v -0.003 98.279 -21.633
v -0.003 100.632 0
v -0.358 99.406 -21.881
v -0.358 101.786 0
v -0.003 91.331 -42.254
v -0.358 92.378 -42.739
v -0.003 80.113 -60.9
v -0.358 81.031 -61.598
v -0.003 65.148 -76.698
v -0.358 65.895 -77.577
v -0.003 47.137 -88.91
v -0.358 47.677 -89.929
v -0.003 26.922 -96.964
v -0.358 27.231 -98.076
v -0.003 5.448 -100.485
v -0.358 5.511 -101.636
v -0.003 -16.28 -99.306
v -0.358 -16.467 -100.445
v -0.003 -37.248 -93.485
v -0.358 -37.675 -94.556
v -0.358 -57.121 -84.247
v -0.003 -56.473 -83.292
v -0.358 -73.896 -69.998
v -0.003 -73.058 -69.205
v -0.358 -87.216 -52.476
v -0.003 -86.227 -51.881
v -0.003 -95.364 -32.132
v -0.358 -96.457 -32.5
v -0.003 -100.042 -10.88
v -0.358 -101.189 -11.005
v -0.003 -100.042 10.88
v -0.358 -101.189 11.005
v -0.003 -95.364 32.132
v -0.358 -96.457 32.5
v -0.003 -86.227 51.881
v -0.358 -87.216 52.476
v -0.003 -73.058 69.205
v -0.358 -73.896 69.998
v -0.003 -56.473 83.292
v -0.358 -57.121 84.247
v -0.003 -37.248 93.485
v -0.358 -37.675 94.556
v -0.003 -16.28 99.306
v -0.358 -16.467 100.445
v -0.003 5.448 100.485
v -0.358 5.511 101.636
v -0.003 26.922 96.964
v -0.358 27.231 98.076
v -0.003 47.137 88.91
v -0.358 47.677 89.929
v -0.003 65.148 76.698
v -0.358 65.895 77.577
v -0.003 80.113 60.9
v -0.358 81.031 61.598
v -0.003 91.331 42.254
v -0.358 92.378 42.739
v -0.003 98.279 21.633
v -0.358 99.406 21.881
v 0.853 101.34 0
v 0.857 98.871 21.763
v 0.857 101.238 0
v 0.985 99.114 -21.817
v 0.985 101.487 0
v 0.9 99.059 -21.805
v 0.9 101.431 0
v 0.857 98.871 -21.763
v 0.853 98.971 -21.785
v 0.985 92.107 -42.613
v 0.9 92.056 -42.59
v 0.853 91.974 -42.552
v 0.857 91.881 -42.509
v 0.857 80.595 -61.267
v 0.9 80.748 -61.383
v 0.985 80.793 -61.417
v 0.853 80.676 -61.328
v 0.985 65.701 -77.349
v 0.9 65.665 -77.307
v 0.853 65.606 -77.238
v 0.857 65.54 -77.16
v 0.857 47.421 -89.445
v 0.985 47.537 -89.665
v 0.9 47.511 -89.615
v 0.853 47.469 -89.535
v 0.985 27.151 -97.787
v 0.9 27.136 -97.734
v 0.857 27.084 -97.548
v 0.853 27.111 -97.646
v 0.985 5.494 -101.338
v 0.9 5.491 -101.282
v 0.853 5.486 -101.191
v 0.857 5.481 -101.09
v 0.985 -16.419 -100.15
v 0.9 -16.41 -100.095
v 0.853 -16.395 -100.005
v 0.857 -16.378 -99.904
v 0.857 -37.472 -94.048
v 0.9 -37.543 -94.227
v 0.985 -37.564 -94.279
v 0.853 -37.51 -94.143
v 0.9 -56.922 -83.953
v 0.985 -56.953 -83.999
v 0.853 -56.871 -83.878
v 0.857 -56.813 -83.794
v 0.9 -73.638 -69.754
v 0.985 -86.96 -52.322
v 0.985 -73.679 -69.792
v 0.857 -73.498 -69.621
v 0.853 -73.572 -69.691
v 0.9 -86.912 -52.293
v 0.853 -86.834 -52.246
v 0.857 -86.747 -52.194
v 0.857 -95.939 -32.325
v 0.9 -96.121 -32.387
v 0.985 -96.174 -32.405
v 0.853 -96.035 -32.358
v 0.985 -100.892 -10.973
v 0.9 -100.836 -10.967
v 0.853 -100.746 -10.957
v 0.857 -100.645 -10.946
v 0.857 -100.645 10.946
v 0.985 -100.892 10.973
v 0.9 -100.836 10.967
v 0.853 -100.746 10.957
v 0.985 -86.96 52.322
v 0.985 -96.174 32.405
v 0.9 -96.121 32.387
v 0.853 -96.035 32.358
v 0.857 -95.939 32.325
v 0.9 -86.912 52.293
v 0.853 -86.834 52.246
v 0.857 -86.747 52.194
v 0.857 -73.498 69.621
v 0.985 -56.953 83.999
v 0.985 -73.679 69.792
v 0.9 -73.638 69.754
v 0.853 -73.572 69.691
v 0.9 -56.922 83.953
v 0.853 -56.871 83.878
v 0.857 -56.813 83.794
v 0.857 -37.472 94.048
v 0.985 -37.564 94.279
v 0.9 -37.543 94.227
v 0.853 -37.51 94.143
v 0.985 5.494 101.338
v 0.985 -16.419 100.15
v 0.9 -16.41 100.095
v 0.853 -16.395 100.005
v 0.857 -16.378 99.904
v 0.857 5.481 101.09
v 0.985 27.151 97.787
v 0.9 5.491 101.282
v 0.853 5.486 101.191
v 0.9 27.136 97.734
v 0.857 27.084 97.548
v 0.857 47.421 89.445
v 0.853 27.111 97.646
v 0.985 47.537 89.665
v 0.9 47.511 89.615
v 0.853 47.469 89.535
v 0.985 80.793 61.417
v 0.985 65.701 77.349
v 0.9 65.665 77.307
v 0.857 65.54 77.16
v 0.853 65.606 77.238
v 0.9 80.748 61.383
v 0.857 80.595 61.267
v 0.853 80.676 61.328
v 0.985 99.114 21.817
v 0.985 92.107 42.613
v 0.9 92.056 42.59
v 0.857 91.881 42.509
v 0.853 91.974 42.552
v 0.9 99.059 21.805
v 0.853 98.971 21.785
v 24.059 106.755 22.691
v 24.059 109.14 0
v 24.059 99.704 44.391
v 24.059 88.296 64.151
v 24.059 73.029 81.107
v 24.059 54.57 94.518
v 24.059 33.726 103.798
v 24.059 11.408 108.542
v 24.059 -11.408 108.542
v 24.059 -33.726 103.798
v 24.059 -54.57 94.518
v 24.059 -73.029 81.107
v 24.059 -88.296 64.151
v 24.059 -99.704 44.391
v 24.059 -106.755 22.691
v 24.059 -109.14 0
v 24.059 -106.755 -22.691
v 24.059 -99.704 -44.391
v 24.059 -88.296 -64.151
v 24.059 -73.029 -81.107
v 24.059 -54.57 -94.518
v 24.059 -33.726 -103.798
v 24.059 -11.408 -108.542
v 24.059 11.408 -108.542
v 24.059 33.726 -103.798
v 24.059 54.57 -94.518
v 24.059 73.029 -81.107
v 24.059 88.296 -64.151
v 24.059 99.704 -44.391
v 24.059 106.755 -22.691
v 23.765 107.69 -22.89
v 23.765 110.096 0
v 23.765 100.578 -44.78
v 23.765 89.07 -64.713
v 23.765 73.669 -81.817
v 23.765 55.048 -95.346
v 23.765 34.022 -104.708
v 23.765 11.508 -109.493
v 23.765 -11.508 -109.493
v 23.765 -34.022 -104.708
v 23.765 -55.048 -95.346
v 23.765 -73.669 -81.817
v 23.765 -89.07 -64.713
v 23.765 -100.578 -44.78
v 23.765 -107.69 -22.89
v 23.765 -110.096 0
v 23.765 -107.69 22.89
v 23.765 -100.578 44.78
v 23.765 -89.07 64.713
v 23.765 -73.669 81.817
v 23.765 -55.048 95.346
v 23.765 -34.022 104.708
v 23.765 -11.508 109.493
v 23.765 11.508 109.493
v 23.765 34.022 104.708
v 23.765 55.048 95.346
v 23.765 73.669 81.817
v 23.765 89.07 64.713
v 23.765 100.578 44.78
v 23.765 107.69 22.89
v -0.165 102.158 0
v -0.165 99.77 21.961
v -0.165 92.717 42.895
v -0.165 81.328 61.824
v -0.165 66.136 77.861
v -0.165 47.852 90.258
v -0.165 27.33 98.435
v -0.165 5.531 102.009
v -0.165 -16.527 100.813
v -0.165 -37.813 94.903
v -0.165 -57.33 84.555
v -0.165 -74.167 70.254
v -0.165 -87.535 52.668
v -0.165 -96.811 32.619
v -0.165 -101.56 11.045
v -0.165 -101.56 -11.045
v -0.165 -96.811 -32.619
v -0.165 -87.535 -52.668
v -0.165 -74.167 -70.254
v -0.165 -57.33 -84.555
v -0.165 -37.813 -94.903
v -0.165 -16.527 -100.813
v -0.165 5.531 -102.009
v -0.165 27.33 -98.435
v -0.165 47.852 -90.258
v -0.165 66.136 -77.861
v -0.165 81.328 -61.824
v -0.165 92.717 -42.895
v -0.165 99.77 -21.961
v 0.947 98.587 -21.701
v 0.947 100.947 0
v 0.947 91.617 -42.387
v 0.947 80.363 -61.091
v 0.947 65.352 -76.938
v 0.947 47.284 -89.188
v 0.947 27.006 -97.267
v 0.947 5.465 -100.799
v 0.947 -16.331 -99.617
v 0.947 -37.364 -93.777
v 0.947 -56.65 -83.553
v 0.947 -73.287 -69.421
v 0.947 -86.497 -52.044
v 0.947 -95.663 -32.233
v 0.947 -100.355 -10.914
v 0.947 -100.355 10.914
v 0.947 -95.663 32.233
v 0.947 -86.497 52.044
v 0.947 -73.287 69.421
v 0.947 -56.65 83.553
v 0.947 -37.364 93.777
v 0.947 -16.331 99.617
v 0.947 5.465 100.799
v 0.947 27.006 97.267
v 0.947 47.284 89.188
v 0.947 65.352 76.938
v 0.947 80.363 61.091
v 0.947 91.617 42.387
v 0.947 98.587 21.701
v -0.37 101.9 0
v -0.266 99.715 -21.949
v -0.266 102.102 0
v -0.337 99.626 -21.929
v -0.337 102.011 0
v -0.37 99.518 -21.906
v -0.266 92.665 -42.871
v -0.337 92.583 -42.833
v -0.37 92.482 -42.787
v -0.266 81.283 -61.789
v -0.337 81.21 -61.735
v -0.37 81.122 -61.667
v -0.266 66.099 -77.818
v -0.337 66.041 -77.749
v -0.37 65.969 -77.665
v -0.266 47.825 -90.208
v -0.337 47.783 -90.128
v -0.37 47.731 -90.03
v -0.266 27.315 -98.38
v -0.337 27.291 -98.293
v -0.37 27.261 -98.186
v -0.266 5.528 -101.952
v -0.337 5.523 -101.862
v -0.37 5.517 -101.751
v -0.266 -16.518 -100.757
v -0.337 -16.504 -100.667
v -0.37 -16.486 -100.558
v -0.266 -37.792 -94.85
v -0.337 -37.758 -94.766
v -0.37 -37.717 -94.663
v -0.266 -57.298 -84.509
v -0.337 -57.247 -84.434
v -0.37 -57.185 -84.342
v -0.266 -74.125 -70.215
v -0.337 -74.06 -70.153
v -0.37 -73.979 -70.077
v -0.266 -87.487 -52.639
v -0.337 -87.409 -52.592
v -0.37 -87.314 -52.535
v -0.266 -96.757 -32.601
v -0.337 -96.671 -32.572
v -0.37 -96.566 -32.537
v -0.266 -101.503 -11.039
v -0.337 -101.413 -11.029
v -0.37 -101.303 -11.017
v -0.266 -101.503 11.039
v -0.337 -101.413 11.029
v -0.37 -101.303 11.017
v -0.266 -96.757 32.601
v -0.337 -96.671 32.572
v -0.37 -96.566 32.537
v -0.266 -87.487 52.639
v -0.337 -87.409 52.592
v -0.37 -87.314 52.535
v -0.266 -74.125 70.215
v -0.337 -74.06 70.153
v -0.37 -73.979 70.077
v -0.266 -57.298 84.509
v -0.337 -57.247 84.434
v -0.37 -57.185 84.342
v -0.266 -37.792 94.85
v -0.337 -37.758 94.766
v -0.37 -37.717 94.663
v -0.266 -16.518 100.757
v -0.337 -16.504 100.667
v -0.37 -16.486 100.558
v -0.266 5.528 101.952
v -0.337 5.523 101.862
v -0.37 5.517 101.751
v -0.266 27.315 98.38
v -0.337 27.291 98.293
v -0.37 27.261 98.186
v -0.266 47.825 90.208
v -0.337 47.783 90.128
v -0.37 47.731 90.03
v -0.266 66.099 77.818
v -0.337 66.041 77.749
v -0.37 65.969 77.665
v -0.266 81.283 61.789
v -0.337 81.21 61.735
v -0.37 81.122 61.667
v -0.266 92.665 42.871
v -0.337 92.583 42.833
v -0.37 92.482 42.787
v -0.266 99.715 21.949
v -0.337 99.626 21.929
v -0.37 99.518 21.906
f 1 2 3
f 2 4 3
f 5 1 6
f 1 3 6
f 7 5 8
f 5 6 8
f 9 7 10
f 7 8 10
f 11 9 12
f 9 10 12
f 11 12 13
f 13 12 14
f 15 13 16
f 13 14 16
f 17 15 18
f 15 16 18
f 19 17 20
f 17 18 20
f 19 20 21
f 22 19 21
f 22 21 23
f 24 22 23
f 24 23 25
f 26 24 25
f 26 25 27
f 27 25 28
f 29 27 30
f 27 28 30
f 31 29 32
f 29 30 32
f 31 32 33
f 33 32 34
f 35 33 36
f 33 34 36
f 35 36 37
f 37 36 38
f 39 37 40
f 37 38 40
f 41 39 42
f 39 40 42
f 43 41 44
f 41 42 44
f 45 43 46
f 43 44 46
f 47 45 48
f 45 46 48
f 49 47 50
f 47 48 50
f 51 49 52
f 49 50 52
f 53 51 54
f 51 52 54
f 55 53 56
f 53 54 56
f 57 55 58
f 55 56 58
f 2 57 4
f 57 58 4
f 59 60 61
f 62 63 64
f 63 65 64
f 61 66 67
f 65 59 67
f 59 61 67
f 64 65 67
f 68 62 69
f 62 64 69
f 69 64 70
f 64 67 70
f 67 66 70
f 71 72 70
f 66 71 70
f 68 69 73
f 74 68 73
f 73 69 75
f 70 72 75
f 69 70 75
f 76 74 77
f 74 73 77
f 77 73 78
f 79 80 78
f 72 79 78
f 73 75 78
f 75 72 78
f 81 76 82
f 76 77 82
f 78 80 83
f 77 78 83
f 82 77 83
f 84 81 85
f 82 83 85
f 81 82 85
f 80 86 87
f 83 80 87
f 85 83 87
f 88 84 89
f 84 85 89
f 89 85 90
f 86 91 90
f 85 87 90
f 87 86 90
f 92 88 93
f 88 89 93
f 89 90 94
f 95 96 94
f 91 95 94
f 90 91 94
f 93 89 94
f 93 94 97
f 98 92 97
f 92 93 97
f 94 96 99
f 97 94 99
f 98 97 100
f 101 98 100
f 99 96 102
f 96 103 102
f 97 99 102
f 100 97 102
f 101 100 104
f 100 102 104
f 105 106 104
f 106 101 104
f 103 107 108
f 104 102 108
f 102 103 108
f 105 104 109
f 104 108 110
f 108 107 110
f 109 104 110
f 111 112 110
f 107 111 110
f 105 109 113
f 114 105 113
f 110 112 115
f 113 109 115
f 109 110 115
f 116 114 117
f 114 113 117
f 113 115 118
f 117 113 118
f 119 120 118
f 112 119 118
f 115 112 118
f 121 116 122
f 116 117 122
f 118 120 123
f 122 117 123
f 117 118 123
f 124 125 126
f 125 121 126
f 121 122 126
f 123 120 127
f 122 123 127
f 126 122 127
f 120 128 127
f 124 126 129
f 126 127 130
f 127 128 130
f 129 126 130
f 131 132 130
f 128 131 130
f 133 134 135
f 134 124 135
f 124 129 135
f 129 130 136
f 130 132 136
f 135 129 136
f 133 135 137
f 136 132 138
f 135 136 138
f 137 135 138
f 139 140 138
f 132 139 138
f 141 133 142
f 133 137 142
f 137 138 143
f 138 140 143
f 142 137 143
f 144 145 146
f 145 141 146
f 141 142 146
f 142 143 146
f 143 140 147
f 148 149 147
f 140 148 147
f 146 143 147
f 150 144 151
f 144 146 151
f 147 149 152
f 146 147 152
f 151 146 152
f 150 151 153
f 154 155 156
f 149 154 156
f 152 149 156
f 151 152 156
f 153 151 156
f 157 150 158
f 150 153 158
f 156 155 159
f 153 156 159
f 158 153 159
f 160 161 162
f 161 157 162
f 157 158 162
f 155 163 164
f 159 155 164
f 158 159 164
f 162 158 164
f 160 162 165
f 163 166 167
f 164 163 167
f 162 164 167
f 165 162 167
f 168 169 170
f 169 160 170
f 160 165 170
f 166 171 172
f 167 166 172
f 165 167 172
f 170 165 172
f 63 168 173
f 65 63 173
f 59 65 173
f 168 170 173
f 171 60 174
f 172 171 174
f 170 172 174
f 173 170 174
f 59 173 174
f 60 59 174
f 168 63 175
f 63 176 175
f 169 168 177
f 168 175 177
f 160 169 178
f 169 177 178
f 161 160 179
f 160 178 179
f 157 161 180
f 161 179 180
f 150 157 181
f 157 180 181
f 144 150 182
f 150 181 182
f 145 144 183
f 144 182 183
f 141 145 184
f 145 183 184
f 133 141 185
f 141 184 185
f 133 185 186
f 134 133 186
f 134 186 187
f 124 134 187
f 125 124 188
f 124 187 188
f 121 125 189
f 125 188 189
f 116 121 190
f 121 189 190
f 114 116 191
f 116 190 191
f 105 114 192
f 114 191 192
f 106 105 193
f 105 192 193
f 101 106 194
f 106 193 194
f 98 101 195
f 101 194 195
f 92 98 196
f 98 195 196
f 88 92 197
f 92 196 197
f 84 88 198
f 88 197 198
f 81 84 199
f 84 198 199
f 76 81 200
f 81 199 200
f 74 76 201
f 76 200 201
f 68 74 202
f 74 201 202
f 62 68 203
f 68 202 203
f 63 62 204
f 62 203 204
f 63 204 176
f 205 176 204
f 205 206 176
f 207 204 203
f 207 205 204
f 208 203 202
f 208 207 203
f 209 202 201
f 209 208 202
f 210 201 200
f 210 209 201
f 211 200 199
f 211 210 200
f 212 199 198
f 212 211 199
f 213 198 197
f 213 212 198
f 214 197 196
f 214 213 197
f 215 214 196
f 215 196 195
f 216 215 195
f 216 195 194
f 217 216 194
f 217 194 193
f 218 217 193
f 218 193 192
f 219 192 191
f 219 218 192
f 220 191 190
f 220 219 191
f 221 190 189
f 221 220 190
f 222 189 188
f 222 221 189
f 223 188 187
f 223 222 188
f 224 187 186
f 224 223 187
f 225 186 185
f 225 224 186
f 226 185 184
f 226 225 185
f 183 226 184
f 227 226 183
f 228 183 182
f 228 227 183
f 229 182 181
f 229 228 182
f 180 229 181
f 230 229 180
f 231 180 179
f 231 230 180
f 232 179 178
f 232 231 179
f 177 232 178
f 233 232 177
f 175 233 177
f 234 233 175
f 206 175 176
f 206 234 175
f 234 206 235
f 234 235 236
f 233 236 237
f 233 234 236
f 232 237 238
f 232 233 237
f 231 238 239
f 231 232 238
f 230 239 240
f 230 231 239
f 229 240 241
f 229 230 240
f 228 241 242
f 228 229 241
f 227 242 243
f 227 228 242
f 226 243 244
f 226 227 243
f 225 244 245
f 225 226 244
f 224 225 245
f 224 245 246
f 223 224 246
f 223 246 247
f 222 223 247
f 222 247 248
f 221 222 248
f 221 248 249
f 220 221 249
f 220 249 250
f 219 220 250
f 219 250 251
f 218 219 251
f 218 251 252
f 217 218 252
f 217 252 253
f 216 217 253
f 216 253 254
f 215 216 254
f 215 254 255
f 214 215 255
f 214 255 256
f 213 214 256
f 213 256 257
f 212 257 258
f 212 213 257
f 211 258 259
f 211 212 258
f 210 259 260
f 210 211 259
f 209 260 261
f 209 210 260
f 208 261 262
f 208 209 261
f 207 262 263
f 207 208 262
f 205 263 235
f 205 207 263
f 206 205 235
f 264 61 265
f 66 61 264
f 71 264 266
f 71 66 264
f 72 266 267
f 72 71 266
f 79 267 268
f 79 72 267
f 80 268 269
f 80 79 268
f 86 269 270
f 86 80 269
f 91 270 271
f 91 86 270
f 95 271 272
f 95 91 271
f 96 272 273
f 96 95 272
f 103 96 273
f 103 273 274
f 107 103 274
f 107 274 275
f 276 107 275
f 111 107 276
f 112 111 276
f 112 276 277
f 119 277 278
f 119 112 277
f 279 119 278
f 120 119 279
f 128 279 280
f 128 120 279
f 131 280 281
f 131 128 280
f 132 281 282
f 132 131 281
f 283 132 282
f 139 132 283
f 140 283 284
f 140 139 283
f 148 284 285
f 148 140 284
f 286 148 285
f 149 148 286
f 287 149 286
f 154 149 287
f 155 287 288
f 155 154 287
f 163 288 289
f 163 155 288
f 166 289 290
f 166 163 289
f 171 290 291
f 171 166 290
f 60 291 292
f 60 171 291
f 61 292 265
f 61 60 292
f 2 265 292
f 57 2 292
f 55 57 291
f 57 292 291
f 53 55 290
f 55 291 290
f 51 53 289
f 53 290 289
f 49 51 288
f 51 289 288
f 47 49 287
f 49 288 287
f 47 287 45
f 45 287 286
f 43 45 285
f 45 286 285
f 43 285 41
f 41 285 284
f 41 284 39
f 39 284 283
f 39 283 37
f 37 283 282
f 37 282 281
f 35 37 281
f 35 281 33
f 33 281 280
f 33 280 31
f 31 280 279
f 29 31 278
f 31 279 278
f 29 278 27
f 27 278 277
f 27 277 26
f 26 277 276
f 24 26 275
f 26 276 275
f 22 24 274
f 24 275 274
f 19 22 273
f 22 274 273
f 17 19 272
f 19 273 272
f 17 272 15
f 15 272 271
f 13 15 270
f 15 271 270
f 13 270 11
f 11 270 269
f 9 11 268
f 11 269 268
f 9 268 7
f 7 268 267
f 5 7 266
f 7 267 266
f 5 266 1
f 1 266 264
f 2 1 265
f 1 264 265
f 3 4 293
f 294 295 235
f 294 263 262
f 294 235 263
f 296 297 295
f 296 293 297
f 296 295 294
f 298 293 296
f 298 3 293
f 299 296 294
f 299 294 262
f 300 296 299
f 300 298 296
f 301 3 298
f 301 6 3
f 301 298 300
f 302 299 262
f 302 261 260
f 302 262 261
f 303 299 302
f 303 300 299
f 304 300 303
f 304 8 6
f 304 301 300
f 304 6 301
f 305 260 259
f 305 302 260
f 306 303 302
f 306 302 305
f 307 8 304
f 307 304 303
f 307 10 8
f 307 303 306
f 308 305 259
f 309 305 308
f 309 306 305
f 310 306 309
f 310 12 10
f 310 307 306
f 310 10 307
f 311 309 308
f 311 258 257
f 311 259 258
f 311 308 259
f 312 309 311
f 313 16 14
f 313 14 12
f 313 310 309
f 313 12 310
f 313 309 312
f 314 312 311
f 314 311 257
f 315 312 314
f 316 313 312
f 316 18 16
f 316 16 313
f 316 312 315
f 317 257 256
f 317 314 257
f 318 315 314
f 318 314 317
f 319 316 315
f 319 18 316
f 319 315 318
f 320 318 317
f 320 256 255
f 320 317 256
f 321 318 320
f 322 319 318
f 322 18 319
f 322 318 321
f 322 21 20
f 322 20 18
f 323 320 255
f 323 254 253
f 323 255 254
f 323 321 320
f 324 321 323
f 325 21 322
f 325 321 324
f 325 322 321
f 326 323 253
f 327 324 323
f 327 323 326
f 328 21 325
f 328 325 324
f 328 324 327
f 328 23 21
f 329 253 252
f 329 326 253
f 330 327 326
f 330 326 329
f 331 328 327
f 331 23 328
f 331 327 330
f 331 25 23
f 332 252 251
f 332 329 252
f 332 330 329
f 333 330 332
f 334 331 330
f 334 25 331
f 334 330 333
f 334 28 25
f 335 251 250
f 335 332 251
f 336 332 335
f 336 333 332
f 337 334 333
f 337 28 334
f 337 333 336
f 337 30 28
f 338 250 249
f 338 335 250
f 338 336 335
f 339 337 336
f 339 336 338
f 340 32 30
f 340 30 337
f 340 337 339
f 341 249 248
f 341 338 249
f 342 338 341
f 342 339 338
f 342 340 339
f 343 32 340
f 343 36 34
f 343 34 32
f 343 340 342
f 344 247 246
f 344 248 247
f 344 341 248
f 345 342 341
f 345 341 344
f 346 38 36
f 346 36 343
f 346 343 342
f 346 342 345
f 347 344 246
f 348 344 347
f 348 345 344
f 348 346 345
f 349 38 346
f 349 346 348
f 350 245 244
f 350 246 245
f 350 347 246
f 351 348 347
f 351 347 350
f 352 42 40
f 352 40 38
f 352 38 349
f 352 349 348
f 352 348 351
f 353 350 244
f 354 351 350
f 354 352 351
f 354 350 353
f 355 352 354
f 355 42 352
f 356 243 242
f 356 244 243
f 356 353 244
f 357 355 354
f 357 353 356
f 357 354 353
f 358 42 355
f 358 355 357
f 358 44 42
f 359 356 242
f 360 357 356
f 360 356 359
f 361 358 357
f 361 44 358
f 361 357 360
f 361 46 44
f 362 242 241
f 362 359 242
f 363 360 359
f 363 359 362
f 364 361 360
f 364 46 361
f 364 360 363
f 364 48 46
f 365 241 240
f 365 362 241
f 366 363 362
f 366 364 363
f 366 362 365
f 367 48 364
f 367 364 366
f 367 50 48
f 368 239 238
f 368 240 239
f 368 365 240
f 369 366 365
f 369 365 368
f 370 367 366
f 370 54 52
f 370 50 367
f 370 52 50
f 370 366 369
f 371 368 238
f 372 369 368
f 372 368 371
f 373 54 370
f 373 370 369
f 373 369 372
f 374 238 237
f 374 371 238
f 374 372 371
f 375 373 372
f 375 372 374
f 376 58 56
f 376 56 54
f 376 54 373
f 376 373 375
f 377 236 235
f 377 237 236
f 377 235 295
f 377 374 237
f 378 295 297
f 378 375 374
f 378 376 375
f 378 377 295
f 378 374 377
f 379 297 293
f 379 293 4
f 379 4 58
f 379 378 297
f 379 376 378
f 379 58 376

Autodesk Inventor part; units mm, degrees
sketch "Sketch_1" plane through (0, 0, 0) normal (0, 0, 1) x (1, 0, 0)
  line L0 (50, 0) -> (-50, 0)
  arc A0 (-0.1653, 102.1585) -> (-0.3576, 101.7856) centre (-0.0709, 101.8738) ccw
  line L1 (-0.3576, 101.7856) -> (-0.0028, 100.6321)
  line L2 (-0.0028, 100.6321) -> (0.9466, 100.947)
  line L3 (0.9466, 100.947) -> (0.8571, 101.238)
  arc A1 (0.9853, 101.4866) -> (0.8571, 101.238) centre (1.0482, 101.2968) ccw
  line L4 (0.9853, 101.4866) -> (24.0593, 109.1399)
  line L5 (24.0593, 109.1399) -> (23.7652, 110.096)
  line L6 (23.7652, 110.096) -> (-0.1653, 102.1585)
revolve "Revolution1" add sketch "Sketch_1" angle 360 about axis through (50, 0, 0) along (1, 0, 0)
ref_plane "cage_XY" through (0, 0, 0) normal (0, 0, 1) x (1, 0, 0)
ref_plane "cage_YZ" through (0, 0, 0) normal (1, 0, 0) x (0, 1, 0)
ref_plane "cage_ZX" through (0, 0, 0) normal (0, 1, 0) x (0, 0, 1)
ref_plane "roller1_XY" through (0, 100.0165, 0) normal (1, 0, 0) x (0, 0, -1)
ref_plane "roller1_YZ" through (0, 100.0165, 0) normal (0, 0, -1) x (0, 1, 0)
ref_plane "roller1_ZX" through (0, 100.0165, 0) normal (0, 1, 0) x (1, 0, 0)
ref_plane "roller10_XY" through (0, 4.2448, 99.9264) normal (1, 0, 0) x (0, 0.9991, -0.0424)
ref_plane "roller10_YZ" through (0, 4.2448, 99.9264) normal (0, 0.9991, -0.0424) x (0, 0.0424, 0.9991)
ref_plane "roller10_ZX" through (0, 4.2448, 99.9264) normal (0, 0.0424, 0.9991) x (1, 0, 0)
ref_plane "roller11_XY" through (0, -12.7039, 99.2064) normal (1, 0, 0) x (0, 0.9919, 0.127)
ref_plane "roller11_YZ" through (0, -12.7039, 99.2064) normal (0, 0.9919, 0.127) x (0, -0.127, 0.9919)
ref_plane "roller11_ZX" through (0, -12.7039, 99.2064) normal (0, -0.127, 0.9919) x (1, 0, 0)
ref_plane "roller12_XY" through (0, -29.2871, 95.6325) normal (1, 0, 0) x (0, 0.9562, 0.2928)
ref_plane "roller12_YZ" through (0, -29.2871, 95.6325) normal (0, 0.9562, 0.2928) x (0, -0.2928, 0.9562)
ref_plane "roller12_ZX" through (0, -29.2871, 95.6325) normal (0, -0.2928, 0.9562) x (1, 0, 0)
ref_plane "roller13_XY" through (0, -45.0278, 89.3073) normal (1, 0, 0) x (0, 0.8929, 0.4502)
ref_plane "roller13_YZ" through (0, -45.0278, 89.3073) normal (0, 0.8929, 0.4502) x (0, -0.4502, 0.8929)
ref_plane "roller13_ZX" through (0, -45.0278, 89.3073) normal (0, -0.4502, 0.8929) x (1, 0, 0)
ref_plane "roller14_XY" through (0, -59.4731, 80.413) normal (1, 0, 0) x (0, 0.804, 0.5946)
ref_plane "roller14_YZ" through (0, -59.4731, 80.413) normal (0, 0.804, 0.5946) x (0, -0.5946, 0.804)
ref_plane "roller14_ZX" through (0, -59.4731, 80.413) normal (0, -0.5946, 0.804) x (1, 0, 0)
ref_plane "roller15_XY" through (0, -72.2075, 69.2053) normal (1, 0, 0) x (0, 0.6919, 0.722)
ref_plane "roller15_YZ" through (0, -72.2075, 69.2053) normal (0, 0.6919, 0.722) x (0, -0.722, 0.6919)
ref_plane "roller15_ZX" through (0, -72.2075, 69.2053) normal (0, -0.722, 0.6919) x (1, 0, 0)
ref_plane "roller16_XY" through (0, -82.8646, 56.0067) normal (1, 0, 0) x (0, 0.56, 0.8285)
ref_plane "roller16_YZ" through (0, -82.8646, 56.0067) normal (0, 0.56, 0.8285) x (0, -0.8285, 0.56)
ref_plane "roller16_ZX" through (0, -82.8646, 56.0067) normal (0, -0.8285, 0.56) x (1, 0, 0)
ref_plane "roller17_XY" through (0, -91.1379, 41.1969) normal (1, 0, 0) x (0, 0.4119, 0.9112)
ref_plane "roller17_YZ" through (0, -91.1379, 41.1969) normal (0, 0.4119, 0.9112) x (0, -0.9112, 0.4119)
ref_plane "roller17_ZX" through (0, -91.1379, 41.1969) normal (0, -0.9112, 0.4119) x (1, 0, 0)
ref_plane "roller18_XY" through (0, -96.7893, 25.202) normal (1, 0, 0) x (0, 0.252, 0.9677)
ref_plane "roller18_YZ" through (0, -96.7893, 25.202) normal (0, 0.252, 0.9677) x (0, -0.9677, 0.252)
ref_plane "roller18_ZX" through (0, -96.7893, 25.202) normal (0, -0.9677, 0.252) x (1, 0, 0)
ref_plane "roller19_XY" through (0, -99.6562, 8.482) normal (1, 0, 0) x (0, 0.0848, 0.9964)
ref_plane "roller19_YZ" through (0, -99.6562, 8.482) normal (0, 0.0848, 0.9964) x (0, -0.9964, 0.0848)
ref_plane "roller19_ZX" through (0, -99.6562, 8.482) normal (0, -0.9964, 0.0848) x (1, 0, 0)
ref_plane "roller2_XY" through (0, 98.5779, 16.9029) normal (1, 0, 0) x (0, 0.169, -0.9856)
ref_plane "roller2_YZ" through (0, 98.5779, 16.9029) normal (0, 0.169, -0.9856) x (0, 0.9856, 0.169)
ref_plane "roller2_ZX" through (0, 98.5779, 16.9029) normal (0, 0.9856, 0.169) x (1, 0, 0)
ref_plane "roller20_XY" through (0, -99.6562, -8.482) normal (1, 0, 0) x (0, -0.0848, 0.9964)
ref_plane "roller20_YZ" through (0, -99.6562, -8.482) normal (0, -0.0848, 0.9964) x (0, -0.9964, -0.0848)
ref_plane "roller20_ZX" through (0, -99.6562, -8.482) normal (0, -0.9964, -0.0848) x (1, 0, 0)
ref_plane "roller21_XY" through (0, -96.7893, -25.202) normal (1, 0, 0) x (0, -0.252, 0.9677)
ref_plane "roller21_YZ" through (0, -96.7893, -25.202) normal (0, -0.252, 0.9677) x (0, -0.9677, -0.252)
ref_plane "roller21_ZX" through (0, -96.7893, -25.202) normal (0, -0.9677, -0.252) x (1, 0, 0)
ref_plane "roller22_XY" through (0, -91.1379, -41.1969) normal (1, 0, 0) x (0, -0.4119, 0.9112)
ref_plane "roller22_YZ" through (0, -91.1379, -41.1969) normal (0, -0.4119, 0.9112) x (0, -0.9112, -0.4119)
ref_plane "roller22_ZX" through (0, -91.1379, -41.1969) normal (0, -0.9112, -0.4119) x (1, 0, 0)
ref_plane "roller23_XY" through (0, -82.8646, -56.0067) normal (1, 0, 0) x (0, -0.56, 0.8285)
ref_plane "roller23_YZ" through (0, -82.8646, -56.0067) normal (0, -0.56, 0.8285) x (0, -0.8285, -0.56)
ref_plane "roller23_ZX" through (0, -82.8646, -56.0067) normal (0, -0.8285, -0.56) x (1, 0, 0)
ref_plane "roller24_XY" through (0, -72.2075, -69.2053) normal (1, 0, 0) x (0, -0.6919, 0.722)
ref_plane "roller24_YZ" through (0, -72.2075, -69.2053) normal (0, -0.6919, 0.722) x (0, -0.722, -0.6919)
ref_plane "roller24_ZX" through (0, -72.2075, -69.2053) normal (0, -0.722, -0.6919) x (1, 0, 0)
ref_plane "roller25_XY" through (0, -59.4731, -80.413) normal (1, 0, 0) x (0, -0.804, 0.5946)
ref_plane "roller25_YZ" through (0, -59.4731, -80.413) normal (0, -0.804, 0.5946) x (0, -0.5946, -0.804)
ref_plane "roller25_ZX" through (0, -59.4731, -80.413) normal (0, -0.5946, -0.804) x (1, 0, 0)
ref_plane "roller26_XY" through (0, -45.0278, -89.3073) normal (1, 0, 0) x (0, -0.8929, 0.4502)
ref_plane "roller26_YZ" through (0, -45.0278, -89.3073) normal (0, -0.8929, 0.4502) x (0, -0.4502, -0.8929)
ref_plane "roller26_ZX" through (0, -45.0278, -89.3073) normal (0, -0.4502, -0.8929) x (1, 0, 0)
ref_plane "roller27_XY" through (0, -29.2871, -95.6325) normal (1, 0, 0) x (0, -0.9562, 0.2928)
ref_plane "roller27_YZ" through (0, -29.2871, -95.6325) normal (0, -0.9562, 0.2928) x (0, -0.2928, -0.9562)
ref_plane "roller27_ZX" through (0, -29.2871, -95.6325) normal (0, -0.2928, -0.9562) x (1, 0, 0)
ref_plane "roller28_XY" through (0, -12.7039, -99.2064) normal (1, 0, 0) x (0, -0.9919, 0.127)
ref_plane "roller28_YZ" through (0, -12.7039, -99.2064) normal (0, -0.9919, 0.127) x (0, -0.127, -0.9919)
ref_plane "roller28_ZX" through (0, -12.7039, -99.2064) normal (0, -0.127, -0.9919) x (1, 0, 0)
ref_plane "roller29_XY" through (0, 4.2448, -99.9264) normal (1, 0, 0) x (0, -0.9991, -0.0424)
ref_plane "roller29_YZ" through (0, 4.2448, -99.9264) normal (0, -0.9991, -0.0424) x (0, 0.0424, -0.9991)
ref_plane "roller29_ZX" through (0, 4.2448, -99.9264) normal (0, 0.0424, -0.9991) x (1, 0, 0)
ref_plane "roller3_XY" through (0, 94.3033, 33.3195) normal (1, 0, 0) x (0, 0.3331, -0.9429)
ref_plane "roller3_YZ" through (0, 94.3033, 33.3195) normal (0, 0.3331, -0.9429) x (0, 0.9429, 0.3331)
ref_plane "roller3_ZX" through (0, 94.3033, 33.3195) normal (0, 0.9429, 0.3331) x (1, 0, 0)
ref_plane "roller30_XY" through (0, 21.0714, -97.7717) normal (1, 0, 0) x (0, -0.9776, -0.2107)
ref_plane "roller30_YZ" through (0, 21.0714, -97.7717) normal (0, -0.9776, -0.2107) x (0, 0.2107, -0.9776)
ref_plane "roller30_ZX" through (0, 21.0714, -97.7717) normal (0, 0.2107, -0.9776) x (1, 0, 0)
ref_plane "roller31_XY" through (0, 37.2918, -92.8042) normal (1, 0, 0) x (0, -0.9279, -0.3729)
ref_plane "roller31_YZ" through (0, 37.2918, -92.8042) normal (0, -0.9279, -0.3729) x (0, 0.3729, -0.9279)
ref_plane "roller31_ZX" through (0, 37.2918, -92.8042) normal (0, 0.3729, -0.9279) x (1, 0, 0)
ref_plane "roller32_XY" through (0, 52.4394, -85.167) normal (1, 0, 0) x (0, -0.8515, -0.5243)
ref_plane "roller32_YZ" through (0, 52.4394, -85.167) normal (0, -0.8515, -0.5243) x (0, 0.5243, -0.8515)
ref_plane "roller32_ZX" through (0, 52.4394, -85.167) normal (0, 0.5243, -0.8515) x (1, 0, 0)
ref_plane "roller33_XY" through (0, 66.0784, -75.0796) normal (1, 0, 0) x (0, -0.7507, -0.6607)
ref_plane "roller33_YZ" through (0, 66.0784, -75.0796) normal (0, -0.7507, -0.6607) x (0, 0.6607, -0.7507)
ref_plane "roller33_ZX" through (0, 66.0784, -75.0796) normal (0, 0.6607, -0.7507) x (1, 0, 0)
ref_plane "roller34_XY" through (0, 77.8164, -62.8324) normal (1, 0, 0) x (0, -0.6282, -0.778)
ref_plane "roller34_YZ" through (0, 77.8164, -62.8324) normal (0, -0.6282, -0.778) x (0, 0.778, -0.6282)
ref_plane "roller34_ZX" through (0, 77.8164, -62.8324) normal (0, 0.778, -0.6282) x (1, 0, 0)
ref_plane "roller35_XY" through (0, 87.3158, -48.7775) normal (1, 0, 0) x (0, -0.4877, -0.873)
ref_plane "roller35_YZ" through (0, 87.3158, -48.7775) normal (0, -0.4877, -0.873) x (0, 0.873, -0.4877)
ref_plane "roller35_ZX" through (0, 87.3158, -48.7775) normal (0, 0.873, -0.4877) x (1, 0, 0)
ref_plane "roller36_XY" through (0, 94.3033, -33.3195) normal (1, 0, 0) x (0, -0.3331, -0.9429)
ref_plane "roller36_YZ" through (0, 94.3033, -33.3195) normal (0, -0.3331, -0.9429) x (0, 0.9429, -0.3331)
ref_plane "roller36_ZX" through (0, 94.3033, -33.3195) normal (0, 0.9429, -0.3331) x (1, 0, 0)
ref_plane "roller37_XY" through (0, 98.5779, -16.9029) normal (1, 0, 0) x (0, -0.169, -0.9856)
ref_plane "roller37_YZ" through (0, 98.5779, -16.9029) normal (0, -0.169, -0.9856) x (0, 0.9856, -0.169)
ref_plane "roller37_ZX" through (0, 98.5779, -16.9029) normal (0, 0.9856, -0.169) x (1, 0, 0)
ref_plane "roller4_XY" through (0, 87.3158, 48.7775) normal (1, 0, 0) x (0, 0.4877, -0.873)
ref_plane "roller4_YZ" through (0, 87.3158, 48.7775) normal (0, 0.4877, -0.873) x (0, 0.873, 0.4877)
ref_plane "roller4_ZX" through (0, 87.3158, 48.7775) normal (0, 0.873, 0.4877) x (1, 0, 0)
ref_plane "roller5_XY" through (0, 77.8164, 62.8324) normal (1, 0, 0) x (0, 0.6282, -0.778)
ref_plane "roller5_YZ" through (0, 77.8164, 62.8324) normal (0, 0.6282, -0.778) x (0, 0.778, 0.6282)
ref_plane "roller5_ZX" through (0, 77.8164, 62.8324) normal (0, 0.778, 0.6282) x (1, 0, 0)
ref_plane "roller6_XY" through (0, 66.0784, 75.0796) normal (1, 0, 0) x (0, 0.7507, -0.6607)
ref_plane "roller6_YZ" through (0, 66.0784, 75.0796) normal (0, 0.7507, -0.6607) x (0, 0.6607, 0.7507)
ref_plane "roller6_ZX" through (0, 66.0784, 75.0796) normal (0, 0.6607, 0.7507) x (1, 0, 0)
ref_plane "roller7_XY" through (0, 52.4394, 85.167) normal (1, 0, 0) x (0, 0.8515, -0.5243)
ref_plane "roller7_YZ" through (0, 52.4394, 85.167) normal (0, 0.8515, -0.5243) x (0, 0.5243, 0.8515)
ref_plane "roller7_ZX" through (0, 52.4394, 85.167) normal (0, 0.5243, 0.8515) x (1, 0, 0)
ref_plane "roller8_XY" through (0, 37.2918, 92.8042) normal (1, 0, 0) x (0, 0.9279, -0.3729)
ref_plane "roller8_YZ" through (0, 37.2918, 92.8042) normal (0, 0.9279, -0.3729) x (0, 0.3729, 0.9279)
ref_plane "roller8_ZX" through (0, 37.2918, 92.8042) normal (0, 0.3729, 0.9279) x (1, 0, 0)
ref_plane "roller9_XY" through (0, 21.0714, 97.7717) normal (1, 0, 0) x (0, 0.9776, -0.2107)
ref_plane "roller9_YZ" through (0, 21.0714, 97.7717) normal (0, 0.9776, -0.2107) x (0, 0.2107, 0.9776)
ref_plane "roller9_ZX" through (0, 21.0714, 97.7717) normal (0, 0.2107, 0.9776) x (1, 0, 0)
properties part number "T4DB 170_cage"
